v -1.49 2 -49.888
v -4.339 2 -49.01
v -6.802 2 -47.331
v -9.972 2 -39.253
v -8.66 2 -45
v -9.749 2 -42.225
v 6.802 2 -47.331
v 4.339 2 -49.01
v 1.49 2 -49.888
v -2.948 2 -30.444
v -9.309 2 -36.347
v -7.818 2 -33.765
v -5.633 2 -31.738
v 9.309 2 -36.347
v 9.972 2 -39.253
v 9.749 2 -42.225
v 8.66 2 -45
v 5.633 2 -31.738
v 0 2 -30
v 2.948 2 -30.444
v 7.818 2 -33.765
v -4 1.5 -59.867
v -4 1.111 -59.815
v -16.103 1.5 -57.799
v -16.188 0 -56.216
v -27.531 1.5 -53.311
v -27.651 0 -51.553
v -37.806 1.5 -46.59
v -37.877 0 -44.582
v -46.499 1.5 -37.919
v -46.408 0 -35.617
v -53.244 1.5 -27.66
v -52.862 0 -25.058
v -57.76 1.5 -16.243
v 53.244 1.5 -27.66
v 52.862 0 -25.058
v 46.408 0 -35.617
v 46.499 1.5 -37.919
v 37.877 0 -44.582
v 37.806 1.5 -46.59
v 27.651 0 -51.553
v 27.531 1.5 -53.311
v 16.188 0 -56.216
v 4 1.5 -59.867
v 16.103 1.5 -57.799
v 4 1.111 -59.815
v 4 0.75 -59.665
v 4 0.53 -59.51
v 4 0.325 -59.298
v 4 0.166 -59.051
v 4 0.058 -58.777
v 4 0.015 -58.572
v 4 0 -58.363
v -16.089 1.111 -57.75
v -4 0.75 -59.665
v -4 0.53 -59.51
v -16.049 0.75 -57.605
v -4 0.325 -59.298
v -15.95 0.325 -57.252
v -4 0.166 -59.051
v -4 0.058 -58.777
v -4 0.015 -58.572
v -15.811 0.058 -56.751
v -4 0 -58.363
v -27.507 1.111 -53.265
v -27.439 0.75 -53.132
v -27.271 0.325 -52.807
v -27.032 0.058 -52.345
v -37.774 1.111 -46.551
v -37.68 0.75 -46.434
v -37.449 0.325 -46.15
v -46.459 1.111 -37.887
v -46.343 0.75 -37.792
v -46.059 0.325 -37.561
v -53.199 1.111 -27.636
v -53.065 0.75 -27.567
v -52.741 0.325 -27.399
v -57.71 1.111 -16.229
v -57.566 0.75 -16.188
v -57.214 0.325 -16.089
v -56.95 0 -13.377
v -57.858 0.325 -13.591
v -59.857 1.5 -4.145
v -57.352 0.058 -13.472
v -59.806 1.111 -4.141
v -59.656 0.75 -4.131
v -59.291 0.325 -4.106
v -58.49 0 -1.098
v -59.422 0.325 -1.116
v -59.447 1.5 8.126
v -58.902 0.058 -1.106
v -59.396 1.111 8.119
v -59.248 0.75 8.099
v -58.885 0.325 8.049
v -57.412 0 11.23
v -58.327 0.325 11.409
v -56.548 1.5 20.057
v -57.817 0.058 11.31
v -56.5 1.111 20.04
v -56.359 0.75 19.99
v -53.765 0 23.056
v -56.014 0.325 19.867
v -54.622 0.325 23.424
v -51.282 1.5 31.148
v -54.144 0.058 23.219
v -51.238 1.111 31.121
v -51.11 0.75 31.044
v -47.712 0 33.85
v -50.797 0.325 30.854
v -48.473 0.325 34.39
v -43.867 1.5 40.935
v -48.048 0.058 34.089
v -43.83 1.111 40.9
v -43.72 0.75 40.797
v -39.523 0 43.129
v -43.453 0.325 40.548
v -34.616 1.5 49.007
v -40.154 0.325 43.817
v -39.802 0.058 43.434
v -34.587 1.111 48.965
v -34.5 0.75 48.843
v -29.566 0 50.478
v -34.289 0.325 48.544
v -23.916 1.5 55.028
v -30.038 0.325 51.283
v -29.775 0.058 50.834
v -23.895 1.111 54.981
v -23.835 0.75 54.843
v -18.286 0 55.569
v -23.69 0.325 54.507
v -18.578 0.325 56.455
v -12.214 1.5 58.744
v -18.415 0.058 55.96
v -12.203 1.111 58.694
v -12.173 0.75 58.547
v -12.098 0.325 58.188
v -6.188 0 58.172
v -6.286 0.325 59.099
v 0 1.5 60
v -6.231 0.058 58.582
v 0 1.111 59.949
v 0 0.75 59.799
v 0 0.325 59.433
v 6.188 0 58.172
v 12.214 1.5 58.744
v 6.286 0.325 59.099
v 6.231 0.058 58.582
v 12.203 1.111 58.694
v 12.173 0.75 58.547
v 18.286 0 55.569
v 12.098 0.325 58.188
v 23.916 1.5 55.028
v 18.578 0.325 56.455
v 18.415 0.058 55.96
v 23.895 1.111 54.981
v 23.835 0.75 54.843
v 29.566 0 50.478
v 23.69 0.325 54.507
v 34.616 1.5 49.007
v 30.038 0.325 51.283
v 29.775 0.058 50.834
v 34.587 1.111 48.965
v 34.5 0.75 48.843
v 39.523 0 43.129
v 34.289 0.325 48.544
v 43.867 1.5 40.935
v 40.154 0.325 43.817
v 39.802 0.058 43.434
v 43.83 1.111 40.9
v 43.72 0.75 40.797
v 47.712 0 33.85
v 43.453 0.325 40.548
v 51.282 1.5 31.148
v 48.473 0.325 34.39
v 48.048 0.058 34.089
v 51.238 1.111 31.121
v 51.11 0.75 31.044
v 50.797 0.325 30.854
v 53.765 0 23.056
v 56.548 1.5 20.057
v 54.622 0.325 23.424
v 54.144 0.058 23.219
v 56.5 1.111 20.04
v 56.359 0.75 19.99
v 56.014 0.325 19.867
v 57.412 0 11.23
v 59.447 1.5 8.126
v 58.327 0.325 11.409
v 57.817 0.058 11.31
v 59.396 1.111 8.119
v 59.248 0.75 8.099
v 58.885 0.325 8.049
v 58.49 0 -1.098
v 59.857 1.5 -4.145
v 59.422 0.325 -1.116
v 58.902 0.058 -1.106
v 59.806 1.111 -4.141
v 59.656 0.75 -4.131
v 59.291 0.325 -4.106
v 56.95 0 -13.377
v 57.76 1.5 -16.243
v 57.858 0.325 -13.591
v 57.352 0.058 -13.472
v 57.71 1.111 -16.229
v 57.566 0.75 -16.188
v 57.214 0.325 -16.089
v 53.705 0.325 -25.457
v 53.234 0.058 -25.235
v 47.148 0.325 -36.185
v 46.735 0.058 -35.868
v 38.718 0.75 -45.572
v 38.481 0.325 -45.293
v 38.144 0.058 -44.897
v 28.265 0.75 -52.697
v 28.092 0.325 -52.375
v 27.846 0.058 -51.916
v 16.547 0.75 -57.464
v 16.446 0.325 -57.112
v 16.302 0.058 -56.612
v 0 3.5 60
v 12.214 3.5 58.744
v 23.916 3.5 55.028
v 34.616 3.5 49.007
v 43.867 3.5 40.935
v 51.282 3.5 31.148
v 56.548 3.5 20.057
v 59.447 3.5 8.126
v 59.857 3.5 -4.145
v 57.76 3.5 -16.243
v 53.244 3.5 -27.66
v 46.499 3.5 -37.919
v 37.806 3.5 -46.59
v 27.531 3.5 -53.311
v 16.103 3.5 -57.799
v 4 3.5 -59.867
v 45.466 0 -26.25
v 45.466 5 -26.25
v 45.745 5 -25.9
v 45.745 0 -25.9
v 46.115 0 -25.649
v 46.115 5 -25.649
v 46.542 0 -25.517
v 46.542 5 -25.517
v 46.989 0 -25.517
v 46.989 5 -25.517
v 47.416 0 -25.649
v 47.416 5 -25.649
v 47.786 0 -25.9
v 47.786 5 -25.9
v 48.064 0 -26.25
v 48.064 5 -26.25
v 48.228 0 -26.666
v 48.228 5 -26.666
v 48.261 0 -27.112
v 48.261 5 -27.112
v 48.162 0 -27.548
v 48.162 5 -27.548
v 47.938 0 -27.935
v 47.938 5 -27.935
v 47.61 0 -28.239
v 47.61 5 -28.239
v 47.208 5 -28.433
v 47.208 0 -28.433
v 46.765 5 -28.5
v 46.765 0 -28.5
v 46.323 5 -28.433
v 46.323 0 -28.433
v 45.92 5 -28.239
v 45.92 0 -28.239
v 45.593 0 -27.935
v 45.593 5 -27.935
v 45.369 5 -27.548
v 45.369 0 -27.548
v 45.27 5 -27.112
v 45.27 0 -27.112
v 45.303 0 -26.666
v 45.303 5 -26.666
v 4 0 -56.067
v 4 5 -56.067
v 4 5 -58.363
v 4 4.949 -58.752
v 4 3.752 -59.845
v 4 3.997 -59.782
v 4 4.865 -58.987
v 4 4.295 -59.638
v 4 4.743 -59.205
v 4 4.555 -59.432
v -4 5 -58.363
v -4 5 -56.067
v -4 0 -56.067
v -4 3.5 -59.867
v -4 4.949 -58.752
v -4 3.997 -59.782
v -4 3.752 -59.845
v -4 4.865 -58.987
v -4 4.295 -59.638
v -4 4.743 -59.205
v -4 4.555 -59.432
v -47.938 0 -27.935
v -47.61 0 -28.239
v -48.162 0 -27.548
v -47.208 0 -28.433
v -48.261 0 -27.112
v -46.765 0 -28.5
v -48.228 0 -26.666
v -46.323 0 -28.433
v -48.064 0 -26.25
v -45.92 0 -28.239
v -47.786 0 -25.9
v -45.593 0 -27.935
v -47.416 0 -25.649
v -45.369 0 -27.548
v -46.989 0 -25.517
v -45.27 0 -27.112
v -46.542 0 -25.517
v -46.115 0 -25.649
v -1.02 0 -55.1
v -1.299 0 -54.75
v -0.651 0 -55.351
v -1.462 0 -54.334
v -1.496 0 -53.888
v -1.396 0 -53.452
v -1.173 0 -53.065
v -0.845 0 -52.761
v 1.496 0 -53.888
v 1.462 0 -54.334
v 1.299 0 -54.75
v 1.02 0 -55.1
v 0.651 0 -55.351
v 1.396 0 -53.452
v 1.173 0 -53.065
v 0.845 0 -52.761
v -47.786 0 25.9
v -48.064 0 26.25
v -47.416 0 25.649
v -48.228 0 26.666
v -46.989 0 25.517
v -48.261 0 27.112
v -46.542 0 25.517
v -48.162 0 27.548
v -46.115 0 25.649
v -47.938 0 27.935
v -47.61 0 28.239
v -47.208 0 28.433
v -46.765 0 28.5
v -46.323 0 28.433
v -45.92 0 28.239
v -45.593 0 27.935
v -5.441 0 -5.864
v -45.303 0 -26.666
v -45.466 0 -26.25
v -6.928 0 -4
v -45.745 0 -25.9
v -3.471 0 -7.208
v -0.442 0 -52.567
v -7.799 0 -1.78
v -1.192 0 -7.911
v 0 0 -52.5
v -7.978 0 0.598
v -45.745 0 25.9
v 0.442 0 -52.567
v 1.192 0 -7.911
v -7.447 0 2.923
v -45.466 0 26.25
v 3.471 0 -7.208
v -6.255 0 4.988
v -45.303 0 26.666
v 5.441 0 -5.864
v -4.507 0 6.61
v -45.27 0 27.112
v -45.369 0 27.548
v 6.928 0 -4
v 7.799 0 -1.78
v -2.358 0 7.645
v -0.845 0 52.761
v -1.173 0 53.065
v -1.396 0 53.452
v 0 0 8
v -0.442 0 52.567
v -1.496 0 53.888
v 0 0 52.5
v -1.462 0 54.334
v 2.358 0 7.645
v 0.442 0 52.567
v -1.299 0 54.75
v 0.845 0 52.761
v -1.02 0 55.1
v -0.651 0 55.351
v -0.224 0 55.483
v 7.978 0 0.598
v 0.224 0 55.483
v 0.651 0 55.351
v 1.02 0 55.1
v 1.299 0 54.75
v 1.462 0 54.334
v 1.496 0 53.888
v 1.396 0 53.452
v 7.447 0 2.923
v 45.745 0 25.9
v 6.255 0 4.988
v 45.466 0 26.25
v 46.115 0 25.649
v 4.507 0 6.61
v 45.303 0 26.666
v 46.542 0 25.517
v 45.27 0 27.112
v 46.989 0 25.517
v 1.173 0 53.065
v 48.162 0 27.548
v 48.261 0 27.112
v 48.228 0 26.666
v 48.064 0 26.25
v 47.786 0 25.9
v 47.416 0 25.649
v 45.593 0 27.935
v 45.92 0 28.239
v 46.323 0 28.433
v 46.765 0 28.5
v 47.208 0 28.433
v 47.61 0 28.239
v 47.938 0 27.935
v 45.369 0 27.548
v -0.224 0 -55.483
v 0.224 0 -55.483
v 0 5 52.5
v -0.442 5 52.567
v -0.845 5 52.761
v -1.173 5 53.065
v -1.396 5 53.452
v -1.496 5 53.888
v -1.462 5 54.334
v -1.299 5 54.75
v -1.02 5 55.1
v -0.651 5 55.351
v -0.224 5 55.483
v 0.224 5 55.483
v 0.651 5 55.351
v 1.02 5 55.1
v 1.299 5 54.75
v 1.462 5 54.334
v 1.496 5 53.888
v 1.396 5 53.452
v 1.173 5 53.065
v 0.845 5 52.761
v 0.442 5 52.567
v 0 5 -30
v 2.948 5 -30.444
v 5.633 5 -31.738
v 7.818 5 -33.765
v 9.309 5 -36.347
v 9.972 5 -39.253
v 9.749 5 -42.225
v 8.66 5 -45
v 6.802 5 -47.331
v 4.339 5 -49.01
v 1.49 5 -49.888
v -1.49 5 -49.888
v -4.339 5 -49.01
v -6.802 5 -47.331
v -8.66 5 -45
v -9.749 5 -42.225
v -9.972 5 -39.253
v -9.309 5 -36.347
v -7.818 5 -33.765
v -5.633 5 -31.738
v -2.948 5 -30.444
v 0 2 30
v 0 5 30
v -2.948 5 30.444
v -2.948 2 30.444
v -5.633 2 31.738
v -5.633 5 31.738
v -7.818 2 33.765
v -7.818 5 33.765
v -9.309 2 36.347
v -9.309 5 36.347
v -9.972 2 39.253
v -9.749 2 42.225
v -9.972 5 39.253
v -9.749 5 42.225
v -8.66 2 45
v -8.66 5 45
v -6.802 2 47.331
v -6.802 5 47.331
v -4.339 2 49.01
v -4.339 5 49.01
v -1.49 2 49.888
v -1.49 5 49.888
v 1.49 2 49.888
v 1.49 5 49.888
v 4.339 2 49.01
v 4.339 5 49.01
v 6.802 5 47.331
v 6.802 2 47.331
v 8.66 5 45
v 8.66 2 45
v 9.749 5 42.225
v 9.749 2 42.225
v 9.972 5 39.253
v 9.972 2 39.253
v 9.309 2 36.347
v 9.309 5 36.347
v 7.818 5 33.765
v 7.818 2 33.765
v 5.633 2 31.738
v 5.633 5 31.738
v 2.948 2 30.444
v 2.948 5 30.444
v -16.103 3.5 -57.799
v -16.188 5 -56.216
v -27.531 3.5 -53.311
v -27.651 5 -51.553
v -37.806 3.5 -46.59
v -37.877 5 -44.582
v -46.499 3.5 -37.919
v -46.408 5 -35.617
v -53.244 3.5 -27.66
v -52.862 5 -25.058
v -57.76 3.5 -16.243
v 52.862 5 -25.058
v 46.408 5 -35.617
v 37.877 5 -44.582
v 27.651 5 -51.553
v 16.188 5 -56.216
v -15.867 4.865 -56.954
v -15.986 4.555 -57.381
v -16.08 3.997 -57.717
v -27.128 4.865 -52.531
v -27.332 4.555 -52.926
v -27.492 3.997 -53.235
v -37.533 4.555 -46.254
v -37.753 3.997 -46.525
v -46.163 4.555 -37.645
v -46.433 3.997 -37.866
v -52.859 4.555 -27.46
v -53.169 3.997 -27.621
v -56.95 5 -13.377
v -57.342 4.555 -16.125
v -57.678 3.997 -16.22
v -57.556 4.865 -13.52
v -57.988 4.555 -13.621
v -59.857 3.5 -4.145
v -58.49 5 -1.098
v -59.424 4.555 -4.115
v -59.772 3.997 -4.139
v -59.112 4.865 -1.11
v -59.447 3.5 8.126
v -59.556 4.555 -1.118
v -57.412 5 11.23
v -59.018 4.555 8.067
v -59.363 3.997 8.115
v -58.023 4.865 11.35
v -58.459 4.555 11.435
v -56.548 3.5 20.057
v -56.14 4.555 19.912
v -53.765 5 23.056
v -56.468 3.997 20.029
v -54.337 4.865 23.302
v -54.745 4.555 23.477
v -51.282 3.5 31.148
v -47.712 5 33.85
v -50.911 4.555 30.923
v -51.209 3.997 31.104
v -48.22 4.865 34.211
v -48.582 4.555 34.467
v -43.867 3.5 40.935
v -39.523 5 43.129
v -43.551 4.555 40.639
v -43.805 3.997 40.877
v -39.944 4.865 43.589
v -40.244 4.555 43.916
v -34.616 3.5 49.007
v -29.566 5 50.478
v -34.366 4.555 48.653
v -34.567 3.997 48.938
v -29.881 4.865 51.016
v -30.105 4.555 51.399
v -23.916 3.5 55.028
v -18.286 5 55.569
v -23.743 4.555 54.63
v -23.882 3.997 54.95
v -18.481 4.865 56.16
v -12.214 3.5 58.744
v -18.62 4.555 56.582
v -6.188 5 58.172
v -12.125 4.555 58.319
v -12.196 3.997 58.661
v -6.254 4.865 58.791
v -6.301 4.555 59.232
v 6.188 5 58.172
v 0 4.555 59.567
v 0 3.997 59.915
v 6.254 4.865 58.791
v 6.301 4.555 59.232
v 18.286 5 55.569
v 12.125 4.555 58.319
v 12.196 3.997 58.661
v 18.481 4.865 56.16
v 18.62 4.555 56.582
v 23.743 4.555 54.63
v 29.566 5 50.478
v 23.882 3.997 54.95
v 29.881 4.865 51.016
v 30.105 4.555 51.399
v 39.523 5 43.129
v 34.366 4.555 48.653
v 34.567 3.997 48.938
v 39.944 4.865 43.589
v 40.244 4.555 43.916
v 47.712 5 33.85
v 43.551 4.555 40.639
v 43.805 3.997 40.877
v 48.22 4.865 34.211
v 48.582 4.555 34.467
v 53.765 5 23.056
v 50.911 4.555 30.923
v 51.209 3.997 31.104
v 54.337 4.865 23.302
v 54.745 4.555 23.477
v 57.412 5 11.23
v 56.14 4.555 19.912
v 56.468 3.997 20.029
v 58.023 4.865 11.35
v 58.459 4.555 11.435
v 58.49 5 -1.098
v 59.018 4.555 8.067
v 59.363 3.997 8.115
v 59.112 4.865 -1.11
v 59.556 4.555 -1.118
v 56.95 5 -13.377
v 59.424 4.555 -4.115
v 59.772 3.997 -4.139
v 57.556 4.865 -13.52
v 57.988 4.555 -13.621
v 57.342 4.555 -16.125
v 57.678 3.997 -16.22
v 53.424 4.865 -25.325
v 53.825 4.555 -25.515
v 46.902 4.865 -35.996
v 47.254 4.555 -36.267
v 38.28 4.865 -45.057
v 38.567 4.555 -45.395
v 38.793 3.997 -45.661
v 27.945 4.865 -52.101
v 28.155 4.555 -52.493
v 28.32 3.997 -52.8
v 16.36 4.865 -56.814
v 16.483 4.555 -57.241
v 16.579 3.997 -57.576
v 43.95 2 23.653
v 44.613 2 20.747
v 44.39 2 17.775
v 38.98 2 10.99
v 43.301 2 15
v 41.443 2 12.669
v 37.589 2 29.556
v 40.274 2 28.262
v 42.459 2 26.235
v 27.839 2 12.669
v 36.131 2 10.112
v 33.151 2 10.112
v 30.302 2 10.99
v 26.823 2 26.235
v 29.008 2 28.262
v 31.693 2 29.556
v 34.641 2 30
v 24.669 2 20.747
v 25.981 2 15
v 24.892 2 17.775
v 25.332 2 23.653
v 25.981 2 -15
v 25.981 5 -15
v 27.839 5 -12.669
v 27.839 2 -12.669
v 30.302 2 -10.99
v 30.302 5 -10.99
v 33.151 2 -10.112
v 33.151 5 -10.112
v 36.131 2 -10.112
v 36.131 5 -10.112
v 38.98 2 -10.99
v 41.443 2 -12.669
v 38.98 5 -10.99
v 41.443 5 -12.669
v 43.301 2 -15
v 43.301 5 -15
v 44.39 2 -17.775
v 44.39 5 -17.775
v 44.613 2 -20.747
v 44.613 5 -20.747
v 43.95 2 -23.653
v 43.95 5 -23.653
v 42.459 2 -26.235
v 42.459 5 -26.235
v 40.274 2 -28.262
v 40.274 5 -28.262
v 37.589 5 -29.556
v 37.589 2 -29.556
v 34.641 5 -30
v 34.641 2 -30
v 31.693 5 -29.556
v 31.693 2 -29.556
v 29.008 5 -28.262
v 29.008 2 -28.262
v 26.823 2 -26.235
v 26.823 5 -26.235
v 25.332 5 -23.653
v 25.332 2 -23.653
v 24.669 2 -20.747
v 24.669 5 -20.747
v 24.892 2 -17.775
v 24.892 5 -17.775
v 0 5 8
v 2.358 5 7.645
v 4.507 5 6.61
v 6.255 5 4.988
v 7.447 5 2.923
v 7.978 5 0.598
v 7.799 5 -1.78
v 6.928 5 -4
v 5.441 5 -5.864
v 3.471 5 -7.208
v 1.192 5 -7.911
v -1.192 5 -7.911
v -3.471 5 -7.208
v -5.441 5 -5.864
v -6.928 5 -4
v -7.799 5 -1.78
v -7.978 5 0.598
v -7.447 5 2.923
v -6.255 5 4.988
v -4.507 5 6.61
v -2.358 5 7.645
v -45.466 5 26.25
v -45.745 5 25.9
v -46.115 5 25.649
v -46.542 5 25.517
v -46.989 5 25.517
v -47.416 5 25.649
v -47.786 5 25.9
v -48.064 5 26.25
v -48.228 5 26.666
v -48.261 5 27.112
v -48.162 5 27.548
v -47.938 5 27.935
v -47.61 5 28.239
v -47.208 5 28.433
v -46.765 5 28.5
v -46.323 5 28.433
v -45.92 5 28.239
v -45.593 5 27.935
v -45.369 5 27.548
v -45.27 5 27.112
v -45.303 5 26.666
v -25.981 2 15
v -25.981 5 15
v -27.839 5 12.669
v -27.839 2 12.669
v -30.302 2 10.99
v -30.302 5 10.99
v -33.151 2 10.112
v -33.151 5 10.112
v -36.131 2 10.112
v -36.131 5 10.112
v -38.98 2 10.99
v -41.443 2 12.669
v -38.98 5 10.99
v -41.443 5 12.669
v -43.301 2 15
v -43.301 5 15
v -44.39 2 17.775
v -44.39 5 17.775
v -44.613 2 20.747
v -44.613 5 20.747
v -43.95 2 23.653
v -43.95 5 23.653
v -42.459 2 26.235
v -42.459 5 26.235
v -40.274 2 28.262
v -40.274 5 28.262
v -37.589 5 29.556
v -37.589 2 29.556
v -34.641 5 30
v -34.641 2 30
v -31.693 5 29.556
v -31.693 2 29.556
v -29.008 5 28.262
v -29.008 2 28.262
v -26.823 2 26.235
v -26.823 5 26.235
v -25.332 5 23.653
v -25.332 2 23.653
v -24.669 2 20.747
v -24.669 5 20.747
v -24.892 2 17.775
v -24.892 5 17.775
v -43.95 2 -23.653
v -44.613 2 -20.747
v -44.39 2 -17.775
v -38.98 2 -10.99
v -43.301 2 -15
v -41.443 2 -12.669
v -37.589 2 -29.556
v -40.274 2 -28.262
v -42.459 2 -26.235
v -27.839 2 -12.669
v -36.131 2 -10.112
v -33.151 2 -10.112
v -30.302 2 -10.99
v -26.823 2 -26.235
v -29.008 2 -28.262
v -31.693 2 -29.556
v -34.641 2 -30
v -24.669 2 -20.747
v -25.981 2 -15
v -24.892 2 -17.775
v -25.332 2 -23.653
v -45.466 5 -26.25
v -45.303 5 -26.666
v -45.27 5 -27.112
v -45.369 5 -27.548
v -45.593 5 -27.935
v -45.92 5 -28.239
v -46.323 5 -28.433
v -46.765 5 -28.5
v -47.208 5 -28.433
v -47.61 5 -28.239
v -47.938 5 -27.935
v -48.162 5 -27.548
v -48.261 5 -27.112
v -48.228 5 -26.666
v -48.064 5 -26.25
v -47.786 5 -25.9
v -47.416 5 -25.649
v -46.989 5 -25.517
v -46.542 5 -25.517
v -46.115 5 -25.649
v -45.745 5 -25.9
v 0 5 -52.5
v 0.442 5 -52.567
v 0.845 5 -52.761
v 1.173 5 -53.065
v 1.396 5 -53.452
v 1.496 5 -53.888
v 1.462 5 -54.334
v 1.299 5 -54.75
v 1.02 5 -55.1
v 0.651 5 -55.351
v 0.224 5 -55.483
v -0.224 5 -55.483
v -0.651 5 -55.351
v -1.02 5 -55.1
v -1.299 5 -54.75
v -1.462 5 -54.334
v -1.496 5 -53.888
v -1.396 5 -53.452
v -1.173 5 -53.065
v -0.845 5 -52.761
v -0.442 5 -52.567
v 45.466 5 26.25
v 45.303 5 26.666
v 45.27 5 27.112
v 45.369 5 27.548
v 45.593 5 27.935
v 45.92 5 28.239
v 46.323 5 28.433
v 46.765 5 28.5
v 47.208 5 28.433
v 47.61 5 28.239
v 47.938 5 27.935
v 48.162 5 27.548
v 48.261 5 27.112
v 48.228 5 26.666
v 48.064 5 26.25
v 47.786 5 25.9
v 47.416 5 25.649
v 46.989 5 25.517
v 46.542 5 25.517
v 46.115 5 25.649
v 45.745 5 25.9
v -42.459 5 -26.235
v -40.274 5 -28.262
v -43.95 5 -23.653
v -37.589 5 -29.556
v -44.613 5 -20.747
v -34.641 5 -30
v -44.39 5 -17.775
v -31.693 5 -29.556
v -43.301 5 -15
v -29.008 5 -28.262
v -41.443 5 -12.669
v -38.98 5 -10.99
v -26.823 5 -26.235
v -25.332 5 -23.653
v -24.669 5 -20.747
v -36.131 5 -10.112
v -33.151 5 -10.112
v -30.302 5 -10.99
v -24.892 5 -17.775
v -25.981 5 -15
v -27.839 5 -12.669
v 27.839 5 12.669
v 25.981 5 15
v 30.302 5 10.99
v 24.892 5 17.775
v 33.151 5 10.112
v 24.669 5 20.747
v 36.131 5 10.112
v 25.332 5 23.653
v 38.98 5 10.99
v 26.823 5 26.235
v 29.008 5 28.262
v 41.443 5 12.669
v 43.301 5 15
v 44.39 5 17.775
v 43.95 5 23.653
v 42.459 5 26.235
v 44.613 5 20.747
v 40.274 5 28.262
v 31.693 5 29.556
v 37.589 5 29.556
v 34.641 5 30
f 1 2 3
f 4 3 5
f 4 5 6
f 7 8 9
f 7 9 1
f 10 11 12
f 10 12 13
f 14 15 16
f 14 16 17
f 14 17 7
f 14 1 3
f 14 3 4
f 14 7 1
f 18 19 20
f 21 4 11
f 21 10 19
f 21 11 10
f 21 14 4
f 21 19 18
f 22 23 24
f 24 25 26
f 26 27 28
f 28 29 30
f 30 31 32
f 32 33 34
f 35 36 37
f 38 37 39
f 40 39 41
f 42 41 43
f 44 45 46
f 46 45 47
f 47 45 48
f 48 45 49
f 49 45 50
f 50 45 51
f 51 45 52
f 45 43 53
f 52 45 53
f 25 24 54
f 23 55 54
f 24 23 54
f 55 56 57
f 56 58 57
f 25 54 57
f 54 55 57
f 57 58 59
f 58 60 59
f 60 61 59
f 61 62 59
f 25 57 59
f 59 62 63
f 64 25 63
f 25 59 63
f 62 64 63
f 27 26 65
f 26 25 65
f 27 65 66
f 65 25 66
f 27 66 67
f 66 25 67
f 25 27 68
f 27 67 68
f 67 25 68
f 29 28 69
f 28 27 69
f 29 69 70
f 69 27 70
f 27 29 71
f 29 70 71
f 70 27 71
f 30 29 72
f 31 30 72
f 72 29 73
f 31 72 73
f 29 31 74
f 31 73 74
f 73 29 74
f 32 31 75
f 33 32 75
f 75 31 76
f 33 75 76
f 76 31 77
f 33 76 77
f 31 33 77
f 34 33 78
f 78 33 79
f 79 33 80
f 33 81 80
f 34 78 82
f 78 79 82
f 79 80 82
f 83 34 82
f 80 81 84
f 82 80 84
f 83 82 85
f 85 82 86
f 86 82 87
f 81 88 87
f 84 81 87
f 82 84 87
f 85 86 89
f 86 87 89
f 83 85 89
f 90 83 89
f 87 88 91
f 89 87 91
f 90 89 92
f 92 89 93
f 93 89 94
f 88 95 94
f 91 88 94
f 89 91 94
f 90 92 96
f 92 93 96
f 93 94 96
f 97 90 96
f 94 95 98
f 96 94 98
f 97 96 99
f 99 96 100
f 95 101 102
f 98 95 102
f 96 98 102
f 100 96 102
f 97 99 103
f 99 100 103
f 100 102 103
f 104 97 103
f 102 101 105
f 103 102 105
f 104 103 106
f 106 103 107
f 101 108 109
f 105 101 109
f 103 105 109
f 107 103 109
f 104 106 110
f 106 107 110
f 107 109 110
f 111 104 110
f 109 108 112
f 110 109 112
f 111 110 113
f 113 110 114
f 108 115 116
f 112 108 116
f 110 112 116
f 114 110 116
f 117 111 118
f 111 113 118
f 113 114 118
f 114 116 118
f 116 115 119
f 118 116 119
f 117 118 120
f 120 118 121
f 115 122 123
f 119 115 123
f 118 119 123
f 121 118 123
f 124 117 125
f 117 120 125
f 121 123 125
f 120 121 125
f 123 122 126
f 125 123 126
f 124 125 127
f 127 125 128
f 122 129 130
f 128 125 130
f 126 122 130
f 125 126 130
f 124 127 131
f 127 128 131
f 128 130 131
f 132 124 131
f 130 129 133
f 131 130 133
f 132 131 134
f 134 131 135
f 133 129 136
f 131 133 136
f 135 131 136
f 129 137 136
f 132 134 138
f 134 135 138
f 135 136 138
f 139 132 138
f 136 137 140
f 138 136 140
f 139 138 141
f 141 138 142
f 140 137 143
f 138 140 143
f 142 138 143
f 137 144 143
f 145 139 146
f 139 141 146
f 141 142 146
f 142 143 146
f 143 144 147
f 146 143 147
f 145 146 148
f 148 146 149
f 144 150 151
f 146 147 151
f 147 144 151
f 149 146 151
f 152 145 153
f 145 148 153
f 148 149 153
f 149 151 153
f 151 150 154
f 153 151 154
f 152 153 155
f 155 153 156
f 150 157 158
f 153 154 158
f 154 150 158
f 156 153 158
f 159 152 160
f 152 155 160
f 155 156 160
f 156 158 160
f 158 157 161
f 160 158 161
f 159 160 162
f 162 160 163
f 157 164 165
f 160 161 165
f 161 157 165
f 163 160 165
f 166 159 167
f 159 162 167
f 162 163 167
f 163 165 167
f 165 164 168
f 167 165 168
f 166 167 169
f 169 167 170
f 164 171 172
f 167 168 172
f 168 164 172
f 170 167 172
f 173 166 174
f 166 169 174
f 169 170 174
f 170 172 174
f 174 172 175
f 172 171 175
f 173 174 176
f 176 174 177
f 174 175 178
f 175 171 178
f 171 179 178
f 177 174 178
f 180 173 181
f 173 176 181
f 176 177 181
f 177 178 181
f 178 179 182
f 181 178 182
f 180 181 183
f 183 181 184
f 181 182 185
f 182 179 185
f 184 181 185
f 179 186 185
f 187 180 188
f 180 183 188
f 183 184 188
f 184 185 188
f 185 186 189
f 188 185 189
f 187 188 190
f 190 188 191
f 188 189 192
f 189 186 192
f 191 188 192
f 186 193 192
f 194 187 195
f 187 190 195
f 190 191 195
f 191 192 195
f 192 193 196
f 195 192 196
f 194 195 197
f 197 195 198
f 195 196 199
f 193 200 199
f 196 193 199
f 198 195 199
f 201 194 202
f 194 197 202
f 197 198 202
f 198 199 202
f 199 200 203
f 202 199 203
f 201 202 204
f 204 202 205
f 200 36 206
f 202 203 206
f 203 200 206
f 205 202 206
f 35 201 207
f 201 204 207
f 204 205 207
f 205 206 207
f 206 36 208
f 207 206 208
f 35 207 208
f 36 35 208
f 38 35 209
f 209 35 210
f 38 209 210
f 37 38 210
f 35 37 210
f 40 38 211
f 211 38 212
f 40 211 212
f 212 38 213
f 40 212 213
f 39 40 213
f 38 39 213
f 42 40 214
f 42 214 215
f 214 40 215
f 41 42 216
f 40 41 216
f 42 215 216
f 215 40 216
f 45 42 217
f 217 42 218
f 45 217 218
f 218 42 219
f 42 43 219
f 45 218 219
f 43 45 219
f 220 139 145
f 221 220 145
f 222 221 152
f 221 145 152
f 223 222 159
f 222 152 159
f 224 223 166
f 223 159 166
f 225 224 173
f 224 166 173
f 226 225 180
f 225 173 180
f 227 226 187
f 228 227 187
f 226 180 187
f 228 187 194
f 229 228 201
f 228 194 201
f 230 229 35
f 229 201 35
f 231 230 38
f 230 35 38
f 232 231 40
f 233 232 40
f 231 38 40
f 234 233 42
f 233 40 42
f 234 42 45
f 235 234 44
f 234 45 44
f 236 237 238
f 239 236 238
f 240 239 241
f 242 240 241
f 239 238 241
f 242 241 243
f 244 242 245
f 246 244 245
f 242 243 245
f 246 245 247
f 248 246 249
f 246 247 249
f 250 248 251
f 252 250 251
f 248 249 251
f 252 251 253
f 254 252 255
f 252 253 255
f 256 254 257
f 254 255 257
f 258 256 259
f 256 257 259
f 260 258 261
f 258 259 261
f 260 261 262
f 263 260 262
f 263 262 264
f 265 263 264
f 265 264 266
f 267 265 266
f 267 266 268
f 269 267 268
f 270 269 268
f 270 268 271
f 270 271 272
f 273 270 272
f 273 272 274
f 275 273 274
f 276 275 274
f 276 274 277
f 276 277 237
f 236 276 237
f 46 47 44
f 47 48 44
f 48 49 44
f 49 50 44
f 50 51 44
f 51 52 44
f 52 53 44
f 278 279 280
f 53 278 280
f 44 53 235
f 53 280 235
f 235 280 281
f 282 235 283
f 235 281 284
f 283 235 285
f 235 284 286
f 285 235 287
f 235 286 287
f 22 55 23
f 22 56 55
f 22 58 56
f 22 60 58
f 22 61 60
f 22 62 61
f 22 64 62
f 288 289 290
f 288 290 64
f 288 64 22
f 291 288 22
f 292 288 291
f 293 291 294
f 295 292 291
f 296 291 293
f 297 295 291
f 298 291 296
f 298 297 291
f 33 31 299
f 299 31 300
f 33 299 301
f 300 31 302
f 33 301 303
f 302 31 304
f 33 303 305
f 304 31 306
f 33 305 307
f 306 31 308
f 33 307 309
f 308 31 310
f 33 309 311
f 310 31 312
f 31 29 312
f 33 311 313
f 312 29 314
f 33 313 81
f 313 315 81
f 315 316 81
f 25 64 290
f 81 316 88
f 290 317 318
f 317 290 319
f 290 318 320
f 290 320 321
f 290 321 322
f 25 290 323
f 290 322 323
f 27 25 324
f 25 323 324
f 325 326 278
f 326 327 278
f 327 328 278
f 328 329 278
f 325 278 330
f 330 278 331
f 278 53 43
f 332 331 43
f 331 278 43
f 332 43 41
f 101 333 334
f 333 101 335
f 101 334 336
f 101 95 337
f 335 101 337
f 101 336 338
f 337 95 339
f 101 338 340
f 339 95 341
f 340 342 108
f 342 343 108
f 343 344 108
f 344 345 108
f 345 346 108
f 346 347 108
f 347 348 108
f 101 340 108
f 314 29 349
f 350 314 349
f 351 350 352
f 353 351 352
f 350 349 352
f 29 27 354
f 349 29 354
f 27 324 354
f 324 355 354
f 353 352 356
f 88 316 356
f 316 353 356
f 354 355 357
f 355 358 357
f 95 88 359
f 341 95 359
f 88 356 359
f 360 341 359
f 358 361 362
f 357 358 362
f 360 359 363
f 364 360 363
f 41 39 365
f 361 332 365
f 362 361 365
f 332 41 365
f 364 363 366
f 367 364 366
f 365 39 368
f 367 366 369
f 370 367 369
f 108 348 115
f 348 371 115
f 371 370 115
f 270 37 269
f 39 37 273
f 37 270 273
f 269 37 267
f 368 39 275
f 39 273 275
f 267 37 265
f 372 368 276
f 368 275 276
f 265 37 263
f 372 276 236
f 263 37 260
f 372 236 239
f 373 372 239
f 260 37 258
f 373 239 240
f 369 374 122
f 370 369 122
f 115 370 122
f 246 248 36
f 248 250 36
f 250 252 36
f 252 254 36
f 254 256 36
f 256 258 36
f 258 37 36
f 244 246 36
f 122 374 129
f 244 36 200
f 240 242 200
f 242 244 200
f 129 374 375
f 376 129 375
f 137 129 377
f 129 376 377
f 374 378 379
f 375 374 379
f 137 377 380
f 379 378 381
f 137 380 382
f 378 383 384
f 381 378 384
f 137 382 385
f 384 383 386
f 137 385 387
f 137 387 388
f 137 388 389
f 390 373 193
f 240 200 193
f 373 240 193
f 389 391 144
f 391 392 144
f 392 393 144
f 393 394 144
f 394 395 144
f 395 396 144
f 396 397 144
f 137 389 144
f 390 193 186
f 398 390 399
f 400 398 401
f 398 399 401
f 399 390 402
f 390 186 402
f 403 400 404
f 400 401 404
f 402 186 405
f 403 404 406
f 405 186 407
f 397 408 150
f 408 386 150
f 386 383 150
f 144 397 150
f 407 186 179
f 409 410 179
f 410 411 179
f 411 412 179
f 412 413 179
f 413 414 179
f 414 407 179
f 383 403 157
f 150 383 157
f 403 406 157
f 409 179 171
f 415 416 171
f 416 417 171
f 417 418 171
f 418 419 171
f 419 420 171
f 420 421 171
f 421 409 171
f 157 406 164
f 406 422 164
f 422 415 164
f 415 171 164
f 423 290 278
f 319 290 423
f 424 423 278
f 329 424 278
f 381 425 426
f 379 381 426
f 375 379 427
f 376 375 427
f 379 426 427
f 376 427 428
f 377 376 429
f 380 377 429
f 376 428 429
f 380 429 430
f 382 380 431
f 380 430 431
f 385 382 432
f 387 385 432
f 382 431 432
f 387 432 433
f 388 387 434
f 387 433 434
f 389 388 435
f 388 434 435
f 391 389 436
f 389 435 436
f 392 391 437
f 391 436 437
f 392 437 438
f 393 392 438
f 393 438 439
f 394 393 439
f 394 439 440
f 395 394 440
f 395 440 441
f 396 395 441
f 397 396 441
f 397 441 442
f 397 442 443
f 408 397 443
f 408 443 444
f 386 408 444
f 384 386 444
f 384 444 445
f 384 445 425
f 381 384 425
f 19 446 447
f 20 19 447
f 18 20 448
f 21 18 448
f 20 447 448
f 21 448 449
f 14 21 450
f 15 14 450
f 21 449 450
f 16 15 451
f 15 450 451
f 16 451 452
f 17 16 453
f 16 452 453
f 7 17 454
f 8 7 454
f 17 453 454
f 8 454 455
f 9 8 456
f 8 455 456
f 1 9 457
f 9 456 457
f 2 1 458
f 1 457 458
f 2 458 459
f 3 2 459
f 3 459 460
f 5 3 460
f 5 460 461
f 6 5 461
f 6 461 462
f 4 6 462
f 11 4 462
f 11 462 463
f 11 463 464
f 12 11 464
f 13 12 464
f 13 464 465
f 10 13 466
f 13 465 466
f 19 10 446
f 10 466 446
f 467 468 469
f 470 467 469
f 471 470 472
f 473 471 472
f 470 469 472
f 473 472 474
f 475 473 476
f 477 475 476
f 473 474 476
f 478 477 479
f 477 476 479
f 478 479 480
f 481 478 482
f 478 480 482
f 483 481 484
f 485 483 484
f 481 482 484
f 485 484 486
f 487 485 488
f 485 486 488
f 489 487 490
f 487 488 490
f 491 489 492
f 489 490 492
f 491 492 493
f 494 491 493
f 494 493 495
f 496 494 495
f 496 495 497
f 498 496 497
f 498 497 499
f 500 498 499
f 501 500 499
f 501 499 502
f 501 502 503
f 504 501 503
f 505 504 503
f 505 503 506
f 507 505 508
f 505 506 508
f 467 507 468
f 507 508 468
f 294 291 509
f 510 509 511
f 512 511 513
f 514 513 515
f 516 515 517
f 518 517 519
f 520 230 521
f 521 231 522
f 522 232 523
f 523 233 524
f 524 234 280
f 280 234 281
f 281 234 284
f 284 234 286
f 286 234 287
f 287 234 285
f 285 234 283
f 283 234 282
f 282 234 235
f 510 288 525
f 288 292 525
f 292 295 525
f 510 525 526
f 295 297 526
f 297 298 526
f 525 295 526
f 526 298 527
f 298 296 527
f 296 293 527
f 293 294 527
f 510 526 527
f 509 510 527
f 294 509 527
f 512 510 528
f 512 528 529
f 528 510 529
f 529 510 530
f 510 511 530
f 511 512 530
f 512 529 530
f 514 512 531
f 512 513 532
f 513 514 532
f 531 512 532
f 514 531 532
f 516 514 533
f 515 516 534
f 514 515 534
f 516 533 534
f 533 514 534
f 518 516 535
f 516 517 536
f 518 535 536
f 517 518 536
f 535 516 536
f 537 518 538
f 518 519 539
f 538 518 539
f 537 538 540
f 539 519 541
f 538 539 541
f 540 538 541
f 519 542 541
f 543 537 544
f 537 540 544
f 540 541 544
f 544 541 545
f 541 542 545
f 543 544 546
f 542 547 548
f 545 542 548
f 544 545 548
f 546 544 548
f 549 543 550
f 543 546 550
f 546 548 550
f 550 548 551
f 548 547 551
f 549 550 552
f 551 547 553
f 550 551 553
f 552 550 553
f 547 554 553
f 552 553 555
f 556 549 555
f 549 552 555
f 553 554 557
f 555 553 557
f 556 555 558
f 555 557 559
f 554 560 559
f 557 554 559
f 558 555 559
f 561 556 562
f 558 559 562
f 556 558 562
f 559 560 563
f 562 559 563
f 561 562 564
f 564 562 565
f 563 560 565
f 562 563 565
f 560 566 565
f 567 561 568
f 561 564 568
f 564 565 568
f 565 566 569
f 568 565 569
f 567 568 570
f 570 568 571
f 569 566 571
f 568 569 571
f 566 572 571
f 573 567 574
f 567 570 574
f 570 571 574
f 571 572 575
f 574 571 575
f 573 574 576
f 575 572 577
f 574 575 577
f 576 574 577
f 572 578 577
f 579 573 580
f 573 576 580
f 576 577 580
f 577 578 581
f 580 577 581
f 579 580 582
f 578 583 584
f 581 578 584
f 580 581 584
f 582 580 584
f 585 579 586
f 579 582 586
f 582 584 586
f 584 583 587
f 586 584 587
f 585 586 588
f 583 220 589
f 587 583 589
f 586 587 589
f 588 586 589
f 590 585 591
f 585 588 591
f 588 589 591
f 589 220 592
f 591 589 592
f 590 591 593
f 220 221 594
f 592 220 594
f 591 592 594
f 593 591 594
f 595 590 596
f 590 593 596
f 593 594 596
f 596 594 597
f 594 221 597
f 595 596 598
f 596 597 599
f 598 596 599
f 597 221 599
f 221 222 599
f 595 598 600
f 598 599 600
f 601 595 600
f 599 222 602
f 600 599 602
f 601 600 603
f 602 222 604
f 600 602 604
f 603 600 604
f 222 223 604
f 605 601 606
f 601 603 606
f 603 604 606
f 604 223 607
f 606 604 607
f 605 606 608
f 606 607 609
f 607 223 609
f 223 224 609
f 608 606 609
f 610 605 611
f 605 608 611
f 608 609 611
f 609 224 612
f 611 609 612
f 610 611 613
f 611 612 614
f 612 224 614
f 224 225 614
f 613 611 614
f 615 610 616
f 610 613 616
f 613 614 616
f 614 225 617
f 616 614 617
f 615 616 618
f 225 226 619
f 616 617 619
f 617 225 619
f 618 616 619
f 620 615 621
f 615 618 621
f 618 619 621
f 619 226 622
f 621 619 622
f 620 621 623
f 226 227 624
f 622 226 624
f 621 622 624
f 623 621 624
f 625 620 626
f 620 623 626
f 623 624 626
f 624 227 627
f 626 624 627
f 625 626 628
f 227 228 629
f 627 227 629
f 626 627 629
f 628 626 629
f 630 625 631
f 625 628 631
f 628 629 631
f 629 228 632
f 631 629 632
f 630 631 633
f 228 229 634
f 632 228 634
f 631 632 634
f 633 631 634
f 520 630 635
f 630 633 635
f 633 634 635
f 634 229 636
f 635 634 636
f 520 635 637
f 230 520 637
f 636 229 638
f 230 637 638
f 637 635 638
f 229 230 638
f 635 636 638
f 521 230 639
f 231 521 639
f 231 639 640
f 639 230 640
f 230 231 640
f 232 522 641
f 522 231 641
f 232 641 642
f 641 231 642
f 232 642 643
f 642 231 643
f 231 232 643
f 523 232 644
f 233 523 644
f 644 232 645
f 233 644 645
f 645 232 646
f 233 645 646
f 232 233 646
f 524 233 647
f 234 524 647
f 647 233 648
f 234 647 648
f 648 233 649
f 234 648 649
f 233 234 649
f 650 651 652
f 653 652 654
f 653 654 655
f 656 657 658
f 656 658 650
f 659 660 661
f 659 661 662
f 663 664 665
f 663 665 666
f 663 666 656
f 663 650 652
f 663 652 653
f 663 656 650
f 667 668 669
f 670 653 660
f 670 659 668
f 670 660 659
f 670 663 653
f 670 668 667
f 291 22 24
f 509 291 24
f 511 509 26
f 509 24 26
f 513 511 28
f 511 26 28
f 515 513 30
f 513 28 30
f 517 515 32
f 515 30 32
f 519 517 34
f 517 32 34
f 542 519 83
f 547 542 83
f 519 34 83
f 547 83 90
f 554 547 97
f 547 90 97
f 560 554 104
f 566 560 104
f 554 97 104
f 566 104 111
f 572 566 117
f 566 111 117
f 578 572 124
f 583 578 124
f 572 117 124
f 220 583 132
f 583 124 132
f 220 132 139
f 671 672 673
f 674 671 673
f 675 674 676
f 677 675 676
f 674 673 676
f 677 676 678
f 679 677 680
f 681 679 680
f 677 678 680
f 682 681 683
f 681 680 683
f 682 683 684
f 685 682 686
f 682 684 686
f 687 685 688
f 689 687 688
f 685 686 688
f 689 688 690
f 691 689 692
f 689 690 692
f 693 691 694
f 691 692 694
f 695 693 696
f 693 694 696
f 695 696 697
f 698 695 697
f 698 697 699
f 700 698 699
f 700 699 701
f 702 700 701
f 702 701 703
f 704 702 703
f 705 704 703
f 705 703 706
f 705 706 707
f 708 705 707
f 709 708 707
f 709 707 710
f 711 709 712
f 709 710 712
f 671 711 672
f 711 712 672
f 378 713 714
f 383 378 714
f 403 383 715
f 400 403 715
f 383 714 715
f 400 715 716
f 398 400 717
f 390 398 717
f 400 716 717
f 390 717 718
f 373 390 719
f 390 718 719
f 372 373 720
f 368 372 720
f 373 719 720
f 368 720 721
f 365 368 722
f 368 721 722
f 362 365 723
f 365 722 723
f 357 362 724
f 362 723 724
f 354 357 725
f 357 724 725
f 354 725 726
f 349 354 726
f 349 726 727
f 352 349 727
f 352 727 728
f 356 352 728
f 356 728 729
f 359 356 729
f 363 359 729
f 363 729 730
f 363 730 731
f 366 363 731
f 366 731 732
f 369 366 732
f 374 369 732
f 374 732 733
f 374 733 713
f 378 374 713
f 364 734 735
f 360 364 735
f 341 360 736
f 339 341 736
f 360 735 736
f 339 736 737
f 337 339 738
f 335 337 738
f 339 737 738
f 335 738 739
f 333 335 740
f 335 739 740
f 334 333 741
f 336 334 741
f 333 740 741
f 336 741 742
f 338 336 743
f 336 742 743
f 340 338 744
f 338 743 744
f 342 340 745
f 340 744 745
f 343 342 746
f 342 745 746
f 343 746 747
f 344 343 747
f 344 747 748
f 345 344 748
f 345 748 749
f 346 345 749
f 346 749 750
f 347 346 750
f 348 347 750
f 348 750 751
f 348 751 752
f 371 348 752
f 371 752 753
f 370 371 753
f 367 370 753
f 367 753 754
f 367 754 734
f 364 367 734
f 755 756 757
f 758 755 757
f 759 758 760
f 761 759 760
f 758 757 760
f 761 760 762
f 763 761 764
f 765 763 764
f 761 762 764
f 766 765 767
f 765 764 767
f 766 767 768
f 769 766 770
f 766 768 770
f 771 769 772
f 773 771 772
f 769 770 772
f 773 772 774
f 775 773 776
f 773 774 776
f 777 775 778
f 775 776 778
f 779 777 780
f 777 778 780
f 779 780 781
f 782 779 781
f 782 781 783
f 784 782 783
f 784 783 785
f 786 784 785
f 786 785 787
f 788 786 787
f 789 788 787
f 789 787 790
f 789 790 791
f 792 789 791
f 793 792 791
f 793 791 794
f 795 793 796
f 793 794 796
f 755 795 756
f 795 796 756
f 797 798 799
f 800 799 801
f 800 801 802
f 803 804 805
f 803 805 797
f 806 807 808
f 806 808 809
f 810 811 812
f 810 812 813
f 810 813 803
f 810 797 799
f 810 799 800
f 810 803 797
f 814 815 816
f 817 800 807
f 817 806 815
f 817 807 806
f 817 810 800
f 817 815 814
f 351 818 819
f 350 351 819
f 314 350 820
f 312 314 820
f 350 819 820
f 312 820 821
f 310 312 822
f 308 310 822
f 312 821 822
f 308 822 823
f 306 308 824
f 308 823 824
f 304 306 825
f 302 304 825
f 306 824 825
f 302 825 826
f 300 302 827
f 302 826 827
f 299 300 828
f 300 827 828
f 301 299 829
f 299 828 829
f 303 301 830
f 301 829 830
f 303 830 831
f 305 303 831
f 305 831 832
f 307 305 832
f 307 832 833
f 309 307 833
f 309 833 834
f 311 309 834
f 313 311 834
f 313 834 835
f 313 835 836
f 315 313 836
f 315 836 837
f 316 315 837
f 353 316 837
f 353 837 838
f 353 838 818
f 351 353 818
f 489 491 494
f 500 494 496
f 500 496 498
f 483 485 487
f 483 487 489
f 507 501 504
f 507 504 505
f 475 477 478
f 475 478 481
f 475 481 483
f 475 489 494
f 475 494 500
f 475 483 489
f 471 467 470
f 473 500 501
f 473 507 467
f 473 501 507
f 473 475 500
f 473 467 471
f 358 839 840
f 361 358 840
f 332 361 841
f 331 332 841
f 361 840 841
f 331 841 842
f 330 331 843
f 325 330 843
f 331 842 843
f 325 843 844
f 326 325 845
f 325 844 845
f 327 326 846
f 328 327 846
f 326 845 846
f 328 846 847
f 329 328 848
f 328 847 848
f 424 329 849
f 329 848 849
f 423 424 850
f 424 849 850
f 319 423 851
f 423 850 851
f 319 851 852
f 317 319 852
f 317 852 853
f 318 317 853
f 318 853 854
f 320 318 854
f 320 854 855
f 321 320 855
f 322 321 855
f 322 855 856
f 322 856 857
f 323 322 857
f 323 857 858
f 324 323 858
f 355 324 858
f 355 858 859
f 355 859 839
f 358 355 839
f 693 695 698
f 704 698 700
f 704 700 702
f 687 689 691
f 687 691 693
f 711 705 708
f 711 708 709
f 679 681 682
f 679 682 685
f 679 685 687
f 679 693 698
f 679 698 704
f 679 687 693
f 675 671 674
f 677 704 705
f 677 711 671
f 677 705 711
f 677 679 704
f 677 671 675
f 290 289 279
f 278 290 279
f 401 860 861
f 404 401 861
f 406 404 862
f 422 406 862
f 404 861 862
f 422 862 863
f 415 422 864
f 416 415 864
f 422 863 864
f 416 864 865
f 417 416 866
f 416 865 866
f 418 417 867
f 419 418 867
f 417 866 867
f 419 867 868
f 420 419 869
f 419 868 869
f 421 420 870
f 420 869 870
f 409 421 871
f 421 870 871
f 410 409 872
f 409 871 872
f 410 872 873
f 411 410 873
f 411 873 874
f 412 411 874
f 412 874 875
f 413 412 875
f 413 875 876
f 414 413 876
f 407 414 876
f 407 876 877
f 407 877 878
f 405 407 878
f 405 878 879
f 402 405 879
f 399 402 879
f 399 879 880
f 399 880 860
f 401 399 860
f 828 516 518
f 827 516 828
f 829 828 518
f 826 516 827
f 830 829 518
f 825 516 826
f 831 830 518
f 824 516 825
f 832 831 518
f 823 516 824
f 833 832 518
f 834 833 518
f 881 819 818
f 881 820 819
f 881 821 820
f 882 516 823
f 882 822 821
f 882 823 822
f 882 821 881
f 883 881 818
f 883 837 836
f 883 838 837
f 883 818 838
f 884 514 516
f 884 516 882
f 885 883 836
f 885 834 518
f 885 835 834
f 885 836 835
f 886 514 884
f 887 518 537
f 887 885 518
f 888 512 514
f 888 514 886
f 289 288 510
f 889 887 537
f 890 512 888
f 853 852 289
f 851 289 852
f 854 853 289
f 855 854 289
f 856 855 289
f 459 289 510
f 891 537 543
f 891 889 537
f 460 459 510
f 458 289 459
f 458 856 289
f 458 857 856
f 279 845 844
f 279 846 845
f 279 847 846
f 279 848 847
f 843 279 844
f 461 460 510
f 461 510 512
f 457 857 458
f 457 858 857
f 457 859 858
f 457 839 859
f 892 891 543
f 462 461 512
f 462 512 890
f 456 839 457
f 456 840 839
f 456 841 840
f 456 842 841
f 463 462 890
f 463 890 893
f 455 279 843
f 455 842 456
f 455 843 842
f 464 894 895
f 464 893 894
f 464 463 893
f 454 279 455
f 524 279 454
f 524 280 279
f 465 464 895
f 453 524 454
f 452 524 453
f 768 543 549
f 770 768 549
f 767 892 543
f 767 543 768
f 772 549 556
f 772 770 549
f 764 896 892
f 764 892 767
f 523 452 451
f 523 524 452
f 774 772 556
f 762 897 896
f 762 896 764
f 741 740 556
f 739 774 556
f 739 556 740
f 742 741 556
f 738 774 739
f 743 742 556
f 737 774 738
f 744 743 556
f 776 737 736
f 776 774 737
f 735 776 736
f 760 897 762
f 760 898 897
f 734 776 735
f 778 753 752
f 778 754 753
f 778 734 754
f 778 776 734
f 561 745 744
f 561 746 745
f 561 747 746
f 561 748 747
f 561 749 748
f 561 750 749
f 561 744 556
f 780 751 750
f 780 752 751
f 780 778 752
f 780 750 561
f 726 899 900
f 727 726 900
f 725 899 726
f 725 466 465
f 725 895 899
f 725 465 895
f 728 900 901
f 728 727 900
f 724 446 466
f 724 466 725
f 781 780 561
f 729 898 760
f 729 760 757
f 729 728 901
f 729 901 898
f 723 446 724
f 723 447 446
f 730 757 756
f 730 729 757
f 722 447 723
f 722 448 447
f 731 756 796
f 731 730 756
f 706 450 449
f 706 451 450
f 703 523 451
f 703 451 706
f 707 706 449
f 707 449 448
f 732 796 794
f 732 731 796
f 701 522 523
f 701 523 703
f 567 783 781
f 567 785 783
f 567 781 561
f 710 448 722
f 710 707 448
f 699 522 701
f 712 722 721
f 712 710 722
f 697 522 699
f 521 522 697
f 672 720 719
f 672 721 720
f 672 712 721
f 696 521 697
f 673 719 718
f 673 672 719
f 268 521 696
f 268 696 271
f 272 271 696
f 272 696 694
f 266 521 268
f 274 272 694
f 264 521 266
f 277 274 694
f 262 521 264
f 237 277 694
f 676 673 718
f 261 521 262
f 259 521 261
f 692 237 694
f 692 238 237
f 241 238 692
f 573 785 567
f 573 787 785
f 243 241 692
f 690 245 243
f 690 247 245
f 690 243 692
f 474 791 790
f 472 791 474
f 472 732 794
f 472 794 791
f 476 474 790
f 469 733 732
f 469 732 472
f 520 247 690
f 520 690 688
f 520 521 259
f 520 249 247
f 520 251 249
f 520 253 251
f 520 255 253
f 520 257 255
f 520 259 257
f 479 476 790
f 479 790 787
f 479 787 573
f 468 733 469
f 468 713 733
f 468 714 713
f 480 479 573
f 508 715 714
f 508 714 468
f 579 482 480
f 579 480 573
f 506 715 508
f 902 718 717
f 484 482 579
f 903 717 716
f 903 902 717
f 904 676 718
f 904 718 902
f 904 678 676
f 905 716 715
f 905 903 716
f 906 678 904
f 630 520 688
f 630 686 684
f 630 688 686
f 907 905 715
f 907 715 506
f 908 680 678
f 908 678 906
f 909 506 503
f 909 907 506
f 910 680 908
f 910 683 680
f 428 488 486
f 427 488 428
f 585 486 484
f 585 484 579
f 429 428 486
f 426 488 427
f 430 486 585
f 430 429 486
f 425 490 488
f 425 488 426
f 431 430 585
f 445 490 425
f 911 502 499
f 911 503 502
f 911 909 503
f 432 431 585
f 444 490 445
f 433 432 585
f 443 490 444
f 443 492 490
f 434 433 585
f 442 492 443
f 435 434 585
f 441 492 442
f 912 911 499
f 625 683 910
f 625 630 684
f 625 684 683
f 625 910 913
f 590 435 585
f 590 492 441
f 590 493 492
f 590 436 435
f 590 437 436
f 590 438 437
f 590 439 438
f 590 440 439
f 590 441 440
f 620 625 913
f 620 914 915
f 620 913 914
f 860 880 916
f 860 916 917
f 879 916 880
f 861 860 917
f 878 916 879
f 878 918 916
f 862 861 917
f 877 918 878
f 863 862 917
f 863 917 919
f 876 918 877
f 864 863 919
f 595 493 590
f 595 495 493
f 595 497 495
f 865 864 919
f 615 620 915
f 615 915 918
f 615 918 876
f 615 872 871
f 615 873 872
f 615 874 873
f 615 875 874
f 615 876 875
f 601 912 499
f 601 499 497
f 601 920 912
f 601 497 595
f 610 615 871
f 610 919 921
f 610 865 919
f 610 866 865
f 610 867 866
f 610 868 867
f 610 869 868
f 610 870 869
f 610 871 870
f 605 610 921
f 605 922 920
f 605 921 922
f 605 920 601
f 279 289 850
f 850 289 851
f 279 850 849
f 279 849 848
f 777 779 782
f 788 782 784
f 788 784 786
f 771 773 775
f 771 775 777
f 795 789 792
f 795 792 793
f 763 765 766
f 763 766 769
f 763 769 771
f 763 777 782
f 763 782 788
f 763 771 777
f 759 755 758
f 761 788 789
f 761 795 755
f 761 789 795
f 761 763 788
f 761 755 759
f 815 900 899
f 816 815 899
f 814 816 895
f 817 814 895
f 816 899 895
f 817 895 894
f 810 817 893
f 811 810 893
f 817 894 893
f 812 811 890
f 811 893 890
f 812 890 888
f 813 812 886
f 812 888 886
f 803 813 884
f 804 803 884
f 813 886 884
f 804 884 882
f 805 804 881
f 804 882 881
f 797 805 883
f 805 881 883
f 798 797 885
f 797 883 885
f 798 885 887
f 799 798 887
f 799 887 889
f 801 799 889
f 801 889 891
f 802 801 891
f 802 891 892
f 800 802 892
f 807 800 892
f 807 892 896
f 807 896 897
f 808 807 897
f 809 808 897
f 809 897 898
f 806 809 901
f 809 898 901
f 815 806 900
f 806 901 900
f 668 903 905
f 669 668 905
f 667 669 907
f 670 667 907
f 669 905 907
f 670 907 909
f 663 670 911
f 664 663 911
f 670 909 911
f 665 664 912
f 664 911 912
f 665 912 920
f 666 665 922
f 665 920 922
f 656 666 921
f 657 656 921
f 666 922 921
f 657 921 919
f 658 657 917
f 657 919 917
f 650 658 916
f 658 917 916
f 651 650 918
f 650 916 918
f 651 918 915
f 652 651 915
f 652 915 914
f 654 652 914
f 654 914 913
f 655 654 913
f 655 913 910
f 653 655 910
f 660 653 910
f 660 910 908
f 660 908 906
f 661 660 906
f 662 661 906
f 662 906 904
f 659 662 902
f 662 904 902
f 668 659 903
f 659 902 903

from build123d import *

# Parameters (mm, degrees)
SKETCH2_R           = 60
BOSS_EXTRUDE1_DEPTH = 5
SKETCH3_R           = 8
CUT_EXTRUDE1_DEPTH  = 86
SKETCH4_R           = 10
CUT_EXTRUDE2_DEPTH  = 3
CIRPATTERN1_COUNT   = 6
SKETCH5_R           = 1.5
CUT_EXTRUDE3_DEPTH  = 86
CIRPATTERN2_COUNT   = 6
SKETCH6_W           = 8
SKETCH6_H           = 4
CUT_EXTRUDE4_DEPTH  = 86
FILLET1_R           = 1.5


with BuildPart() as part:
    # Sketch2 → Boss-Extrude1 (new body)
    with BuildSketch(Plane(origin=(0, 0, 0), x_dir=(1, 0, 0), z_dir=(0, 1, 0))):
        with Locations(Location((0, 0, 0), (0, 0, 270))):
            Circle(SKETCH2_R)
    extrude(amount=BOSS_EXTRUDE1_DEPTH)

    # Sketch3 → Cut-Extrude1 (cut, through all)
    with BuildSketch(Plane(origin=(0, 5, 0), x_dir=(1, 0, 0), z_dir=(0, 1, 0))):
        with Locations(Location((0, 0, 0), (0, 0, 270))):
            Circle(SKETCH3_R)
    extrude(amount=-CUT_EXTRUDE1_DEPTH, mode=Mode.SUBTRACT)

    # Sketch4 → Cut-Extrude2 (cut)
    with BuildSketch(Plane(origin=(0, 5, 0), x_dir=(1, 0, 0), z_dir=(0, 1, 0))):
        with Locations(Location((0, 40, 0), (0, 0, 270))):
            Circle(SKETCH4_R)
    cut_extrude2 = extrude(amount=-CUT_EXTRUDE2_DEPTH, mode=Mode.SUBTRACT)

    # CirPattern1: Cut-Extrude2 ×6 about axis
    cirpattern1_axis = Axis((0, 0, 0), (0, 1, 0))
    for i in range(1, CIRPATTERN1_COUNT):
        add(cut_extrude2.rotate(cirpattern1_axis, i * 360 / CIRPATTERN1_COUNT), mode=Mode.SUBTRACT)

    # Sketch5 → Cut-Extrude3 (cut, through all)
    with BuildSketch(Plane(origin=(0, 5, 0), x_dir=(1, 0, 0), z_dir=(0, 1, 0))):
        with Locations(Location((0, 54, 0), (0, 0, 270))):
            Circle(SKETCH5_R)
    cut_extrude3 = extrude(amount=-CUT_EXTRUDE3_DEPTH, mode=Mode.SUBTRACT)

    # CirPattern2: Cut-Extrude3 ×6 about axis
    cirpattern2_axis = Axis((0, 0, 0), (0, 1, 0))
    for i in range(1, CIRPATTERN2_COUNT):
        add(cut_extrude3.rotate(cirpattern2_axis, i * 360 / CIRPATTERN2_COUNT), mode=Mode.SUBTRACT)

    # Sketch6 → Cut-Extrude4 (cut, through all)
    with BuildSketch(Plane(origin=(0, 5, 0), x_dir=(1, 0, 0), z_dir=(0, 1, 0))):
        with Locations((0, 58.067002871)):
            Rectangle(SKETCH6_W, SKETCH6_H)
    extrude(amount=-CUT_EXTRUDE4_DEPTH, mode=Mode.SUBTRACT)

    # Fillet1
    fillet1_edges = [part.edges().sort_by_distance(p)[0] for p in [
        (59.966620262, 0, 2.001113277),
        (-59.966620262, 5, 2.001113277),
    ]]
    fillet(fillet1_edges, radius=FILLET1_R)


solid = part.part
